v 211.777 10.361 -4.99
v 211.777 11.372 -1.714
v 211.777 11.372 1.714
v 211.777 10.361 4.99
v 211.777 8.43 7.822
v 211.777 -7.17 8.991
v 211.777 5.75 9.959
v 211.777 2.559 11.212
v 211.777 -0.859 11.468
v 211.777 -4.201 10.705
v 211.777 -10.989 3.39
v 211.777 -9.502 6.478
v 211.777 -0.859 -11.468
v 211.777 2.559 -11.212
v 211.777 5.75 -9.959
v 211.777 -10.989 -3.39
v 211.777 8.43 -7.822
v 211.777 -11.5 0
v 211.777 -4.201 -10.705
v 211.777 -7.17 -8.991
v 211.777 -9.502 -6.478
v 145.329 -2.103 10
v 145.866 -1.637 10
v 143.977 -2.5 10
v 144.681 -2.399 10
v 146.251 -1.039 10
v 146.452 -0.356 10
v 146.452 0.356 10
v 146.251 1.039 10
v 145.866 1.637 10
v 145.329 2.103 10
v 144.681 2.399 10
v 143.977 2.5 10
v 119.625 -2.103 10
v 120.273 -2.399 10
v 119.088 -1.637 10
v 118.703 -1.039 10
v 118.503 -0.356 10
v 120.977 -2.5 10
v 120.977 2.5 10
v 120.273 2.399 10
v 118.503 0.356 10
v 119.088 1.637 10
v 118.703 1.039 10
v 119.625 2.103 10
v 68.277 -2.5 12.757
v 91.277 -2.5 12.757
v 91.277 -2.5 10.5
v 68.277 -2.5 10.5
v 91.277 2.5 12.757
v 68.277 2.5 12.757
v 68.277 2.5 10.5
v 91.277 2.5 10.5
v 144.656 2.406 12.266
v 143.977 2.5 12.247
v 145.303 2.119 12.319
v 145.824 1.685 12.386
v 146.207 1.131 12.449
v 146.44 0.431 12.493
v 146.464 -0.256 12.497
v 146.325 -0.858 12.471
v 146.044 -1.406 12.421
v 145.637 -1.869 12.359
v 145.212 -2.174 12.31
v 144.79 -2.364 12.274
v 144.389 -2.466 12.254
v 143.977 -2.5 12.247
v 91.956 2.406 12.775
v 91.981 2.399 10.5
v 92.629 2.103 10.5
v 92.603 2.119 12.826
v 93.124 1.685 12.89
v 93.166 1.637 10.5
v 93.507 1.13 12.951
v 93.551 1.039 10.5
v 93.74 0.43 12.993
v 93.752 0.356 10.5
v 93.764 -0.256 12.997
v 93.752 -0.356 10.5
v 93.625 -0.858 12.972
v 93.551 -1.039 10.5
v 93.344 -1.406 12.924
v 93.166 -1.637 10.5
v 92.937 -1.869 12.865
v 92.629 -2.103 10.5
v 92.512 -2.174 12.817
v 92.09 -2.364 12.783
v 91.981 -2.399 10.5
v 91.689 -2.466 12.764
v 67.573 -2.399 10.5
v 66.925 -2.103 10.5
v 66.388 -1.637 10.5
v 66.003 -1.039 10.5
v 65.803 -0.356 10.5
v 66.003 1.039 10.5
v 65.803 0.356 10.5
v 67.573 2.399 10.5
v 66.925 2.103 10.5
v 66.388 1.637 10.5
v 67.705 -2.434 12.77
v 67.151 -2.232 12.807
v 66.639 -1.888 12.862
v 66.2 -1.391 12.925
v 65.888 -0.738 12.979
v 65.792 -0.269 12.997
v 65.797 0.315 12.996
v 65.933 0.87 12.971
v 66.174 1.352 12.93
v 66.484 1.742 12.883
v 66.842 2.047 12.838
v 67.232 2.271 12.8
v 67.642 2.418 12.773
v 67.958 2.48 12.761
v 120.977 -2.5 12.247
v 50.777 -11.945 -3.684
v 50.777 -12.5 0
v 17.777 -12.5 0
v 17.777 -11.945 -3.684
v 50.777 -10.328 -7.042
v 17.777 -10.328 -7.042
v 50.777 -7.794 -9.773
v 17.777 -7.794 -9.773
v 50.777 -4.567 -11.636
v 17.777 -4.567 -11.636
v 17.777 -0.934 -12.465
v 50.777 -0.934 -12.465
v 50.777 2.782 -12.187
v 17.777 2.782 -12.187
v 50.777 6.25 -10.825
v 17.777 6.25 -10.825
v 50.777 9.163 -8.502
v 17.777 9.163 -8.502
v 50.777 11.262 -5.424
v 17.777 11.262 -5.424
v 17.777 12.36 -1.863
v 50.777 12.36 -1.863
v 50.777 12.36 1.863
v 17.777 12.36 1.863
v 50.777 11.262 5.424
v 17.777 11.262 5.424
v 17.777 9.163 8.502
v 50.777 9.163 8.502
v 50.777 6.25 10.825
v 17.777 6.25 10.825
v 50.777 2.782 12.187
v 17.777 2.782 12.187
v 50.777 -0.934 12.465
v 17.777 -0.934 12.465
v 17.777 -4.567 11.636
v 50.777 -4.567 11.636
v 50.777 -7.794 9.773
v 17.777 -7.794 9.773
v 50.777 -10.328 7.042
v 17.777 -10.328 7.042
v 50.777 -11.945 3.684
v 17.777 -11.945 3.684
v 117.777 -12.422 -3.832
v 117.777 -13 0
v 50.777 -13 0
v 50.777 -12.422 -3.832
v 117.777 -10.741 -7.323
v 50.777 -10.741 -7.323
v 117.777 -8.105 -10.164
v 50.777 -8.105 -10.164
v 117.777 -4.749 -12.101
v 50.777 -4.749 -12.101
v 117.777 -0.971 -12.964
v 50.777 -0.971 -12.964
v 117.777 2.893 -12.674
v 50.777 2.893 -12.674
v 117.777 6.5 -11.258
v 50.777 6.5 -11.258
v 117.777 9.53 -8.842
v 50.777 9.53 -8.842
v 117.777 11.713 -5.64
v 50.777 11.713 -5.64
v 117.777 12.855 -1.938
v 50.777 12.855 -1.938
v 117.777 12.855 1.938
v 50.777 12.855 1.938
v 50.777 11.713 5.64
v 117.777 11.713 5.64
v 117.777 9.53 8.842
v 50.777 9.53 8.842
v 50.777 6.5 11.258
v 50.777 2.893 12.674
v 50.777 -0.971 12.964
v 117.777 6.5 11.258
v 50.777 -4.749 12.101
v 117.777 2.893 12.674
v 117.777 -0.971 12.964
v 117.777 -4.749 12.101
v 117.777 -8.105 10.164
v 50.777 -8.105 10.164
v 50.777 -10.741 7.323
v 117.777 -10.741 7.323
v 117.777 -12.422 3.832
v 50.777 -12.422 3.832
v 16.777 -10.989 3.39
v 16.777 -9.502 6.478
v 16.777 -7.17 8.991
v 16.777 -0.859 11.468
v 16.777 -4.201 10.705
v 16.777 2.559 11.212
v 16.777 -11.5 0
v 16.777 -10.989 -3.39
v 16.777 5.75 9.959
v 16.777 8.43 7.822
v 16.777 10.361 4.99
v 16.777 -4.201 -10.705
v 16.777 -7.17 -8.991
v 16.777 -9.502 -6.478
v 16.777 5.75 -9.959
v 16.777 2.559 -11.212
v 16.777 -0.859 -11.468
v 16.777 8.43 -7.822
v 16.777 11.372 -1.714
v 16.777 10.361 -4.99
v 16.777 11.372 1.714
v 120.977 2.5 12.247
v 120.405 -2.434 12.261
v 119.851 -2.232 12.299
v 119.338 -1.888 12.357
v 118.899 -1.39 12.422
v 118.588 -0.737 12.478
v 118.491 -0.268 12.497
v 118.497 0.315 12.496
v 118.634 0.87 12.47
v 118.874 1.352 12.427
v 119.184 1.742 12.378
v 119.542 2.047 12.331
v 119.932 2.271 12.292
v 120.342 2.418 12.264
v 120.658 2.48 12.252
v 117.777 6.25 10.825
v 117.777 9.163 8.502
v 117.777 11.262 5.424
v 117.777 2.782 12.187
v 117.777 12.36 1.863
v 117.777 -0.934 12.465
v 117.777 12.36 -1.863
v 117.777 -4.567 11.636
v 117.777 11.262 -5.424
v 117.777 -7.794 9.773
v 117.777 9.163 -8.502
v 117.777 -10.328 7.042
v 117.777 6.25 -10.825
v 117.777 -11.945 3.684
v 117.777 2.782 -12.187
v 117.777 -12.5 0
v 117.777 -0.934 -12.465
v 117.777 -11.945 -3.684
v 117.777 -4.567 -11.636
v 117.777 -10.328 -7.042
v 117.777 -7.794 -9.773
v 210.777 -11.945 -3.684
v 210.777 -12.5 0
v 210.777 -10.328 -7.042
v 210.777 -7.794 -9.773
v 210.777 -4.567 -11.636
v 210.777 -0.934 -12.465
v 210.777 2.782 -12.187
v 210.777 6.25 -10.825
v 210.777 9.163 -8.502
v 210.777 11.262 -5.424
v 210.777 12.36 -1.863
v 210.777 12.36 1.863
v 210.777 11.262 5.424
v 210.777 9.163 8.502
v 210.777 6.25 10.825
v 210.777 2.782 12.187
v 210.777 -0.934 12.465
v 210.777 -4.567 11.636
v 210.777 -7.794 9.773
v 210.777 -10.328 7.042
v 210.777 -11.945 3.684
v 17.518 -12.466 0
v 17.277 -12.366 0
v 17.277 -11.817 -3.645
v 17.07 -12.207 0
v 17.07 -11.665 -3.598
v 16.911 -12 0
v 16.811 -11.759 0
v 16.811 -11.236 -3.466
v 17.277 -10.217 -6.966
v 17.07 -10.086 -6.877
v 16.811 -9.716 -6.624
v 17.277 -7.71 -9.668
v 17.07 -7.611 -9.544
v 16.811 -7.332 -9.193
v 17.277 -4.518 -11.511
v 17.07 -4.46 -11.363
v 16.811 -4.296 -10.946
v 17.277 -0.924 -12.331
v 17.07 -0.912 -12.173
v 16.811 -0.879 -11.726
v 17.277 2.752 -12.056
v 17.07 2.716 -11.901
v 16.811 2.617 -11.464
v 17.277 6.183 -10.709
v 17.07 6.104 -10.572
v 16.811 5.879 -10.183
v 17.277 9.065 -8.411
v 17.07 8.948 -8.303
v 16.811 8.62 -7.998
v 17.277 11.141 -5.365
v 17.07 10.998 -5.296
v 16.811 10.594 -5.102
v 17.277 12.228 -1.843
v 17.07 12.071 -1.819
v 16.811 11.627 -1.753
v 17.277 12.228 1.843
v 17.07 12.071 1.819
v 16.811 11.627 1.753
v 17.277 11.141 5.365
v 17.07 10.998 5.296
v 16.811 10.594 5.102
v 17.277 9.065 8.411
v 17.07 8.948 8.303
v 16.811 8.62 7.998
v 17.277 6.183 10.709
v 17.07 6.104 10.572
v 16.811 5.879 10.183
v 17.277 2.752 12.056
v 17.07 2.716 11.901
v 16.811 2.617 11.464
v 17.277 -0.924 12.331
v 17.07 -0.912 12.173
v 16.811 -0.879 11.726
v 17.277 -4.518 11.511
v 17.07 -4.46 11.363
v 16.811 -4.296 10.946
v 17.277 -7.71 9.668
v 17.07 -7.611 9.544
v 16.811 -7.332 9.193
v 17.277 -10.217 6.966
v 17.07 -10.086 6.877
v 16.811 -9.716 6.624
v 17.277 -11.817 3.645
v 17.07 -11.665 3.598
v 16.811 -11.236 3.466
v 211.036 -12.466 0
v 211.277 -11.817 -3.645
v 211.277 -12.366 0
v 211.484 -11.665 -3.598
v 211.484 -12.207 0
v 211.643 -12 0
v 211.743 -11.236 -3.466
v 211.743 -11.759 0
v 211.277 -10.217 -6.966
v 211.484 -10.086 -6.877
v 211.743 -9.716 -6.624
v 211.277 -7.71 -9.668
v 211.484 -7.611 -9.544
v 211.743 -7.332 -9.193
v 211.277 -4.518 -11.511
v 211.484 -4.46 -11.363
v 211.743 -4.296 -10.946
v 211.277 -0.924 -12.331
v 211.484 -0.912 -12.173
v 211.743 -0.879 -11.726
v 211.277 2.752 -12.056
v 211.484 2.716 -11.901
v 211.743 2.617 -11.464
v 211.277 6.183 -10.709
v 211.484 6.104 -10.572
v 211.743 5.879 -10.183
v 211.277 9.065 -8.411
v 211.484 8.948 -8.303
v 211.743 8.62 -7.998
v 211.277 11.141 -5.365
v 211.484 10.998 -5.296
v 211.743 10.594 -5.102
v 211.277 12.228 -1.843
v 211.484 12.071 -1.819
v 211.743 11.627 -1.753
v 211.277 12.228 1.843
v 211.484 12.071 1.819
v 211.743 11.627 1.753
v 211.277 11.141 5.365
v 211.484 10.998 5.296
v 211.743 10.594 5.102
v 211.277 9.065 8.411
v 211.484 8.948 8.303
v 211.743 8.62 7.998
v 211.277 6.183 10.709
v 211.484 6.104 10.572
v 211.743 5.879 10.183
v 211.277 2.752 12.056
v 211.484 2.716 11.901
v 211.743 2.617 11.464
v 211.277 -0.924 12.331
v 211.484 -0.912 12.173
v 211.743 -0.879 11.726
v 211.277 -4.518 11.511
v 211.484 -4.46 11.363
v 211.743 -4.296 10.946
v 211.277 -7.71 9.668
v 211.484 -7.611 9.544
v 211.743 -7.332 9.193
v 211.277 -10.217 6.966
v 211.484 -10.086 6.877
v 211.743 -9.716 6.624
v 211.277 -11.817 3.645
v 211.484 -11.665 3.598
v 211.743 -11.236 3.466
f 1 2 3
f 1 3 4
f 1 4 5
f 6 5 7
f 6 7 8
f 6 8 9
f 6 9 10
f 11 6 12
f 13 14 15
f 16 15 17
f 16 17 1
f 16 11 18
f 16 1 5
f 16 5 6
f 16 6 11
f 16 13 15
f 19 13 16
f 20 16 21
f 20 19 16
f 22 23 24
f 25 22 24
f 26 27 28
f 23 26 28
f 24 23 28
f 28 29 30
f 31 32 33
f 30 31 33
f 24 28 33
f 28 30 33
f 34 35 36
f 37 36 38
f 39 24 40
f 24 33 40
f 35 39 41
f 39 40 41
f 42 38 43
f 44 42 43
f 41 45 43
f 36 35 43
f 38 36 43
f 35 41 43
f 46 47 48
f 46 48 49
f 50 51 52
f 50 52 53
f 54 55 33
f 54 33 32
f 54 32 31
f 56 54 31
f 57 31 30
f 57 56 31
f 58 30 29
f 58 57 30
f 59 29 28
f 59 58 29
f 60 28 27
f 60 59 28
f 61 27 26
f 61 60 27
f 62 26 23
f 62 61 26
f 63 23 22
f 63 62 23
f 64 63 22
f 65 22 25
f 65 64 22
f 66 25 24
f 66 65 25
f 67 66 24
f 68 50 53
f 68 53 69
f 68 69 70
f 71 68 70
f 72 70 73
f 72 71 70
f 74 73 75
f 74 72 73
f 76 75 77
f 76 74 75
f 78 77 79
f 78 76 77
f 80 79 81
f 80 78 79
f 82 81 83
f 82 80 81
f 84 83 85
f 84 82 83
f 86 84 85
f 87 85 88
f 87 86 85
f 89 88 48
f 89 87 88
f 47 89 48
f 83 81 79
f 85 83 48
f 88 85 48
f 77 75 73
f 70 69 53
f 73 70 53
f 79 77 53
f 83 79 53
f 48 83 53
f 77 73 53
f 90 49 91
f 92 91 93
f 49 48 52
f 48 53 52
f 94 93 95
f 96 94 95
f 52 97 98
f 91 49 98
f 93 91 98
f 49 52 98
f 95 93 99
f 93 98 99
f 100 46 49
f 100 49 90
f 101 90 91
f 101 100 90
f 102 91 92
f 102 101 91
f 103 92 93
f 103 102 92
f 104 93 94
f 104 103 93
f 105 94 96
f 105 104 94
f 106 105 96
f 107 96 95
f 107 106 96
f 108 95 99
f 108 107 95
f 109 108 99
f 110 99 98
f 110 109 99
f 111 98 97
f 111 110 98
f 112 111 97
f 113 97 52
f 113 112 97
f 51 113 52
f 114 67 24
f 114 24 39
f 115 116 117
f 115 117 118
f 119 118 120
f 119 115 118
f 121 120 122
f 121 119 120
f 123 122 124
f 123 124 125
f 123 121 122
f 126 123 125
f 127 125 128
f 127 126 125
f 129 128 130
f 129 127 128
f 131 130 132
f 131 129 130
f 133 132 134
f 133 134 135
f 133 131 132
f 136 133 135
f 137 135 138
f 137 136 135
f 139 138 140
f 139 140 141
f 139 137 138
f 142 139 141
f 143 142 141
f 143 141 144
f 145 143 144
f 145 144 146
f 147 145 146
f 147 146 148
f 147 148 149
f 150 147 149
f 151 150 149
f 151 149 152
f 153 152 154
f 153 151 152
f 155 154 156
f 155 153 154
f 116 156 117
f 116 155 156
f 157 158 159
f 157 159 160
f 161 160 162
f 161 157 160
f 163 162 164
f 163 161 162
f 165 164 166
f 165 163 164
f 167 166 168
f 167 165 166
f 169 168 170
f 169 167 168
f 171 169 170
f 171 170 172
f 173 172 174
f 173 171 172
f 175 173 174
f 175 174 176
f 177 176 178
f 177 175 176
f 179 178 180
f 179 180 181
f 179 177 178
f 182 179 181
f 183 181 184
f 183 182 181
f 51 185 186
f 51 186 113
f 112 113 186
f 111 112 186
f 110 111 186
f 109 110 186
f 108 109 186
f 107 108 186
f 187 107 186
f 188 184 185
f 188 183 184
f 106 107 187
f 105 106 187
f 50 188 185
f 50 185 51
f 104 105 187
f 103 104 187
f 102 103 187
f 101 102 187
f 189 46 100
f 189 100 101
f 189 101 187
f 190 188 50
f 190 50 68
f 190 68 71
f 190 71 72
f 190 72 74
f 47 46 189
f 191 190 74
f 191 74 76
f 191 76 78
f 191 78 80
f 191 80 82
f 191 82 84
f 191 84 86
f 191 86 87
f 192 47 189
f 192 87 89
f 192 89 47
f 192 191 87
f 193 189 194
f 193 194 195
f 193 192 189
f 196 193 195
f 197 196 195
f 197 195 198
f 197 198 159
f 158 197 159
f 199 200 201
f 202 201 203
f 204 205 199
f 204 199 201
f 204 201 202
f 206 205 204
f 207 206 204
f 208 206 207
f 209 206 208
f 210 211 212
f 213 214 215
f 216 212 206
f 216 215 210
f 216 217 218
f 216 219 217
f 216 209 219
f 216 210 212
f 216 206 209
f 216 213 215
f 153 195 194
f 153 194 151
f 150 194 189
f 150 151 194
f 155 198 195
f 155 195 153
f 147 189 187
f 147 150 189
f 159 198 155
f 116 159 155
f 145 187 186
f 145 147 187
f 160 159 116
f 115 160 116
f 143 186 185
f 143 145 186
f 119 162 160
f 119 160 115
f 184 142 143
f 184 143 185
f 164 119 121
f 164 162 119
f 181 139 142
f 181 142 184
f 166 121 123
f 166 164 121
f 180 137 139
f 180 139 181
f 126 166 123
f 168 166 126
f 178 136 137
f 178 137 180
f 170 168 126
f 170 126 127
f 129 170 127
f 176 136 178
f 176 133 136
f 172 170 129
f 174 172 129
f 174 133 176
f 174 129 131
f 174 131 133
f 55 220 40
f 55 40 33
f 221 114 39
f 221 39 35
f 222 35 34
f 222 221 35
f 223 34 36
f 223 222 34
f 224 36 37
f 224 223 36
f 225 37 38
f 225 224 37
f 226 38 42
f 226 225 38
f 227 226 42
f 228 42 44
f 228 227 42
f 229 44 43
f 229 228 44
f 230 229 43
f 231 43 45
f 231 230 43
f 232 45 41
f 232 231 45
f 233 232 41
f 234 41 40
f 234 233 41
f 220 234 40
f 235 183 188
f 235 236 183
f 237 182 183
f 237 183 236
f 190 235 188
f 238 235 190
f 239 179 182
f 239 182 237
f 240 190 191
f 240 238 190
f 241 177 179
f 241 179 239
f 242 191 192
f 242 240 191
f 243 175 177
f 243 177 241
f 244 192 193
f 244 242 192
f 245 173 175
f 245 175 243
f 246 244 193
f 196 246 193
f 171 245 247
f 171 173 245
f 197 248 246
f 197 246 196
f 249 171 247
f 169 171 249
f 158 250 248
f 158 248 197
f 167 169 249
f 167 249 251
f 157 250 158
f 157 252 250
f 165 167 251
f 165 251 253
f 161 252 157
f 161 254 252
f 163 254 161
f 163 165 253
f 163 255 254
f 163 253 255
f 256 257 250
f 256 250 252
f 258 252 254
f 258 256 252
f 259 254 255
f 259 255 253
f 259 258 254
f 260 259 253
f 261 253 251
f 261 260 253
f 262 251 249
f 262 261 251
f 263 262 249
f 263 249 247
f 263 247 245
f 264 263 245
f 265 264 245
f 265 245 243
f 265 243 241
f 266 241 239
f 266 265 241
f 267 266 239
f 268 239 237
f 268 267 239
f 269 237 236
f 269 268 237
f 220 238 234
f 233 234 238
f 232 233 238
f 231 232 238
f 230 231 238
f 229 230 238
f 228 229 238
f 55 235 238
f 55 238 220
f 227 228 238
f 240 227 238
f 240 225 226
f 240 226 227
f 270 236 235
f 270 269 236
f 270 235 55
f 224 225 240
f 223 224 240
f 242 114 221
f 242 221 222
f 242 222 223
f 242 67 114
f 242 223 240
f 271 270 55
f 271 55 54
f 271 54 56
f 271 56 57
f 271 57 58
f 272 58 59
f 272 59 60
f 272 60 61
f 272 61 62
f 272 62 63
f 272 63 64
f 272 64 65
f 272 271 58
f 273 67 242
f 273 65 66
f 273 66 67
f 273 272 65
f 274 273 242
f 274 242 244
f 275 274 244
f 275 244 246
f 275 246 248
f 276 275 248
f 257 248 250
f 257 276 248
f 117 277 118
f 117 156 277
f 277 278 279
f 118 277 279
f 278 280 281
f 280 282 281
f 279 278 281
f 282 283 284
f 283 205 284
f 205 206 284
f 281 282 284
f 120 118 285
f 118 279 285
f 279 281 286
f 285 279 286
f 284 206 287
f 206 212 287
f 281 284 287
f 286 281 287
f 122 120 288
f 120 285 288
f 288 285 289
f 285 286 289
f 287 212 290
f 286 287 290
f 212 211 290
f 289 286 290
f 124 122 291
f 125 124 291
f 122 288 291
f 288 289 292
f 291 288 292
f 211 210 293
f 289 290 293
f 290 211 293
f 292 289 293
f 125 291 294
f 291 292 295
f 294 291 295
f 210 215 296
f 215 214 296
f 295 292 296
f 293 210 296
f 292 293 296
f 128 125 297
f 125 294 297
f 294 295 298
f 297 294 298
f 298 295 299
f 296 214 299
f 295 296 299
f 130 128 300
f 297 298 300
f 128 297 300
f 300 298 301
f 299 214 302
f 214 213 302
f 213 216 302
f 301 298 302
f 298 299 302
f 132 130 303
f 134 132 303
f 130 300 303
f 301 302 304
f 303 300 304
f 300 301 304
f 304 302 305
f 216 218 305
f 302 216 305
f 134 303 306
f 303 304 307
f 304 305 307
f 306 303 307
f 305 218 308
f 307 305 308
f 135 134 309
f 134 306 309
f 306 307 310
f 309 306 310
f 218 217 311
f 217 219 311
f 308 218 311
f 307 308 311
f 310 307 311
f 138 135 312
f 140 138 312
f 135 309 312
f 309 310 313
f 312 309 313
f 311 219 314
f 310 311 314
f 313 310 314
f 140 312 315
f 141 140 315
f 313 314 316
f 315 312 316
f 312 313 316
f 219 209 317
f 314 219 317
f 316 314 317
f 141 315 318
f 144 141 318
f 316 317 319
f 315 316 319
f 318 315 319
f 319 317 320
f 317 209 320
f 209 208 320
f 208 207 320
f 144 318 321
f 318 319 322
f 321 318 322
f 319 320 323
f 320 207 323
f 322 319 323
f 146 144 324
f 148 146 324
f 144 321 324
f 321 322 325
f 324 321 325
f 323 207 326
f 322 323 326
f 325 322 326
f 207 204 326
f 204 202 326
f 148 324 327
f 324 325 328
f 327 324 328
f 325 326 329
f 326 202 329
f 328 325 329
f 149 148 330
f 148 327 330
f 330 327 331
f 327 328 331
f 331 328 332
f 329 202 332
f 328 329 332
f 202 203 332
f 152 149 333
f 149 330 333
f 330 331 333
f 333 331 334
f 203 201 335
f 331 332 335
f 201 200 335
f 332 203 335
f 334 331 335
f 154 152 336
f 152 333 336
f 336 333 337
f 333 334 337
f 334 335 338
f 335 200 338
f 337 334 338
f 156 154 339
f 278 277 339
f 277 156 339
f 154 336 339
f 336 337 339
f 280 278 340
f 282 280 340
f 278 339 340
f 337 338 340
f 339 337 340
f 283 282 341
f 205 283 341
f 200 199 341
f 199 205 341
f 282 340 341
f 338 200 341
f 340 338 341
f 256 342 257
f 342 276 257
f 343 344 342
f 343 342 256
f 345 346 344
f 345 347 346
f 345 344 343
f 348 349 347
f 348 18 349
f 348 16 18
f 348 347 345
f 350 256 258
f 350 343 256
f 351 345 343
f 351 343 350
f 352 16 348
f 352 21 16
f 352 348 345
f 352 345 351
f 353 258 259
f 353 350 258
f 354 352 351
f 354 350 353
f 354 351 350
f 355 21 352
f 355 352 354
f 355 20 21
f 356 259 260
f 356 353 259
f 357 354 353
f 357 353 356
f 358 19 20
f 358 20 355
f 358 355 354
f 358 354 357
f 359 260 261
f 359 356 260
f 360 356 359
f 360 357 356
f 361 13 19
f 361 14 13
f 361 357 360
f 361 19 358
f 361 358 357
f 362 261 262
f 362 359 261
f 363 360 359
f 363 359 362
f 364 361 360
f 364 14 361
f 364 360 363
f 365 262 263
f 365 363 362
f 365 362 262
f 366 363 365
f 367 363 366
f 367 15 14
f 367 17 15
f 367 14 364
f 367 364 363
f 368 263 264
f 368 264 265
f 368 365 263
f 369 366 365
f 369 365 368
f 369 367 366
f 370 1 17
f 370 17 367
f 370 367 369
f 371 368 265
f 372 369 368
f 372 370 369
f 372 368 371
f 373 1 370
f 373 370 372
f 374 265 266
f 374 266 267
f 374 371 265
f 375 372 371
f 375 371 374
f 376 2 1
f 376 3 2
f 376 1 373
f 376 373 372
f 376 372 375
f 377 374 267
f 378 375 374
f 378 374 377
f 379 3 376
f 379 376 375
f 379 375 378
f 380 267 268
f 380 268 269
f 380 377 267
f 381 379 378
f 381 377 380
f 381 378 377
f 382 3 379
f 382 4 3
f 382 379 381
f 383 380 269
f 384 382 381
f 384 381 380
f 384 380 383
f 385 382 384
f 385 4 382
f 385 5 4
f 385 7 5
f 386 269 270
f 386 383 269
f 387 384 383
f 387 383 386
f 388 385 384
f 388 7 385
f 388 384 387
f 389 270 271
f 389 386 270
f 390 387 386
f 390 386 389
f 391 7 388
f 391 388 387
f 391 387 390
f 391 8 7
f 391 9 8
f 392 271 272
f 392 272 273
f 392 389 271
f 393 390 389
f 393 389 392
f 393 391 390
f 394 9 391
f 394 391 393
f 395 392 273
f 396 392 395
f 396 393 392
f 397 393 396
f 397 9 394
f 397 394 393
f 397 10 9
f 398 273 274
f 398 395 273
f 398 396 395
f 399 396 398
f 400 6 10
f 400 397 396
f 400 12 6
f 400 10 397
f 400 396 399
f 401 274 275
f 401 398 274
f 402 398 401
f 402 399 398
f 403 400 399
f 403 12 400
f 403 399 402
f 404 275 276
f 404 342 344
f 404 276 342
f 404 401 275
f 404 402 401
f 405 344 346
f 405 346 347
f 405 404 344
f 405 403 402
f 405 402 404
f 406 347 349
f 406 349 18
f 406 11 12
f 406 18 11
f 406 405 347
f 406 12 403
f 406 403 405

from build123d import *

# Parameters (mm, degrees)
CUT_EXTRUDE2_DEPTH = 2.5
CUT_EXTRUDE3_DEPTH = 2.5
FILLET1_R          = 1
FILLET2_R          = 1


with BuildPart() as part:
    # Sketch1 → Revolve1 (revolve)
    with BuildSketch(Plane.XY, mode=Mode.PRIVATE) as revolve1_sk:
        Polygon((16.777055999, 0), (16.777055999, 12.5), (50.777055999, 12.5), (50.777055999, 13), (117.777055999, 13), (117.777055999, 12.5), (211.777055999, 12.5), (211.777055999, 0), align=None)
    revolve(revolve1_sk.sketch.rotate(Axis((0, 0, 0), (1, 0, 0)), 180), axis=Axis((0, 0, 0), (1, 0, 0)))

    # Sketch2 → Cut-Extrude2 (cut)
    with BuildSketch(Plane.XY.offset(12.5)):
        with BuildLine():
            Line((120.977055999, 2.5), (143.977055999, 2.5))
            ThreePointArc((143.977055999, 2.5), (146.477055999, 0), (143.977055999, -2.5))
            Line((143.977055999, -2.5), (120.977055999, -2.5))
            ThreePointArc((120.977055999, -2.5), (118.477055999, 0), (120.977055999, 2.5))
        make_face()
    extrude(amount=-CUT_EXTRUDE2_DEPTH, mode=Mode.SUBTRACT)

    # Sketch3 → Cut-Extrude3 (cut)
    with BuildSketch(Plane.XY.offset(13)):
        with BuildLine():
            Line((68.277055999, 2.5), (91.277055999, 2.5))
            ThreePointArc((91.277055999, 2.5), (93.777055999, 0), (91.277055999, -2.5))
            Line((91.277055999, -2.5), (68.277055999, -2.5))
            ThreePointArc((68.277055999, -2.5), (65.777055999, 0), (68.277055999, 2.5))
        make_face()
    extrude(amount=-CUT_EXTRUDE3_DEPTH, mode=Mode.SUBTRACT)

    # Fillet1
    fillet1_edges = [part.edges().sort_by_distance(p)[0] for p in [
        (211.777055999, 12.5, 0),
    ]]
    fillet(fillet1_edges, radius=FILLET1_R)

    # Fillet2
    fillet2_edges = [part.edges().sort_by_distance(p)[0] for p in [
        (16.777055999, 12.5, 0),
    ]]
    fillet(fillet2_edges, radius=FILLET2_R)


solid = part.part
